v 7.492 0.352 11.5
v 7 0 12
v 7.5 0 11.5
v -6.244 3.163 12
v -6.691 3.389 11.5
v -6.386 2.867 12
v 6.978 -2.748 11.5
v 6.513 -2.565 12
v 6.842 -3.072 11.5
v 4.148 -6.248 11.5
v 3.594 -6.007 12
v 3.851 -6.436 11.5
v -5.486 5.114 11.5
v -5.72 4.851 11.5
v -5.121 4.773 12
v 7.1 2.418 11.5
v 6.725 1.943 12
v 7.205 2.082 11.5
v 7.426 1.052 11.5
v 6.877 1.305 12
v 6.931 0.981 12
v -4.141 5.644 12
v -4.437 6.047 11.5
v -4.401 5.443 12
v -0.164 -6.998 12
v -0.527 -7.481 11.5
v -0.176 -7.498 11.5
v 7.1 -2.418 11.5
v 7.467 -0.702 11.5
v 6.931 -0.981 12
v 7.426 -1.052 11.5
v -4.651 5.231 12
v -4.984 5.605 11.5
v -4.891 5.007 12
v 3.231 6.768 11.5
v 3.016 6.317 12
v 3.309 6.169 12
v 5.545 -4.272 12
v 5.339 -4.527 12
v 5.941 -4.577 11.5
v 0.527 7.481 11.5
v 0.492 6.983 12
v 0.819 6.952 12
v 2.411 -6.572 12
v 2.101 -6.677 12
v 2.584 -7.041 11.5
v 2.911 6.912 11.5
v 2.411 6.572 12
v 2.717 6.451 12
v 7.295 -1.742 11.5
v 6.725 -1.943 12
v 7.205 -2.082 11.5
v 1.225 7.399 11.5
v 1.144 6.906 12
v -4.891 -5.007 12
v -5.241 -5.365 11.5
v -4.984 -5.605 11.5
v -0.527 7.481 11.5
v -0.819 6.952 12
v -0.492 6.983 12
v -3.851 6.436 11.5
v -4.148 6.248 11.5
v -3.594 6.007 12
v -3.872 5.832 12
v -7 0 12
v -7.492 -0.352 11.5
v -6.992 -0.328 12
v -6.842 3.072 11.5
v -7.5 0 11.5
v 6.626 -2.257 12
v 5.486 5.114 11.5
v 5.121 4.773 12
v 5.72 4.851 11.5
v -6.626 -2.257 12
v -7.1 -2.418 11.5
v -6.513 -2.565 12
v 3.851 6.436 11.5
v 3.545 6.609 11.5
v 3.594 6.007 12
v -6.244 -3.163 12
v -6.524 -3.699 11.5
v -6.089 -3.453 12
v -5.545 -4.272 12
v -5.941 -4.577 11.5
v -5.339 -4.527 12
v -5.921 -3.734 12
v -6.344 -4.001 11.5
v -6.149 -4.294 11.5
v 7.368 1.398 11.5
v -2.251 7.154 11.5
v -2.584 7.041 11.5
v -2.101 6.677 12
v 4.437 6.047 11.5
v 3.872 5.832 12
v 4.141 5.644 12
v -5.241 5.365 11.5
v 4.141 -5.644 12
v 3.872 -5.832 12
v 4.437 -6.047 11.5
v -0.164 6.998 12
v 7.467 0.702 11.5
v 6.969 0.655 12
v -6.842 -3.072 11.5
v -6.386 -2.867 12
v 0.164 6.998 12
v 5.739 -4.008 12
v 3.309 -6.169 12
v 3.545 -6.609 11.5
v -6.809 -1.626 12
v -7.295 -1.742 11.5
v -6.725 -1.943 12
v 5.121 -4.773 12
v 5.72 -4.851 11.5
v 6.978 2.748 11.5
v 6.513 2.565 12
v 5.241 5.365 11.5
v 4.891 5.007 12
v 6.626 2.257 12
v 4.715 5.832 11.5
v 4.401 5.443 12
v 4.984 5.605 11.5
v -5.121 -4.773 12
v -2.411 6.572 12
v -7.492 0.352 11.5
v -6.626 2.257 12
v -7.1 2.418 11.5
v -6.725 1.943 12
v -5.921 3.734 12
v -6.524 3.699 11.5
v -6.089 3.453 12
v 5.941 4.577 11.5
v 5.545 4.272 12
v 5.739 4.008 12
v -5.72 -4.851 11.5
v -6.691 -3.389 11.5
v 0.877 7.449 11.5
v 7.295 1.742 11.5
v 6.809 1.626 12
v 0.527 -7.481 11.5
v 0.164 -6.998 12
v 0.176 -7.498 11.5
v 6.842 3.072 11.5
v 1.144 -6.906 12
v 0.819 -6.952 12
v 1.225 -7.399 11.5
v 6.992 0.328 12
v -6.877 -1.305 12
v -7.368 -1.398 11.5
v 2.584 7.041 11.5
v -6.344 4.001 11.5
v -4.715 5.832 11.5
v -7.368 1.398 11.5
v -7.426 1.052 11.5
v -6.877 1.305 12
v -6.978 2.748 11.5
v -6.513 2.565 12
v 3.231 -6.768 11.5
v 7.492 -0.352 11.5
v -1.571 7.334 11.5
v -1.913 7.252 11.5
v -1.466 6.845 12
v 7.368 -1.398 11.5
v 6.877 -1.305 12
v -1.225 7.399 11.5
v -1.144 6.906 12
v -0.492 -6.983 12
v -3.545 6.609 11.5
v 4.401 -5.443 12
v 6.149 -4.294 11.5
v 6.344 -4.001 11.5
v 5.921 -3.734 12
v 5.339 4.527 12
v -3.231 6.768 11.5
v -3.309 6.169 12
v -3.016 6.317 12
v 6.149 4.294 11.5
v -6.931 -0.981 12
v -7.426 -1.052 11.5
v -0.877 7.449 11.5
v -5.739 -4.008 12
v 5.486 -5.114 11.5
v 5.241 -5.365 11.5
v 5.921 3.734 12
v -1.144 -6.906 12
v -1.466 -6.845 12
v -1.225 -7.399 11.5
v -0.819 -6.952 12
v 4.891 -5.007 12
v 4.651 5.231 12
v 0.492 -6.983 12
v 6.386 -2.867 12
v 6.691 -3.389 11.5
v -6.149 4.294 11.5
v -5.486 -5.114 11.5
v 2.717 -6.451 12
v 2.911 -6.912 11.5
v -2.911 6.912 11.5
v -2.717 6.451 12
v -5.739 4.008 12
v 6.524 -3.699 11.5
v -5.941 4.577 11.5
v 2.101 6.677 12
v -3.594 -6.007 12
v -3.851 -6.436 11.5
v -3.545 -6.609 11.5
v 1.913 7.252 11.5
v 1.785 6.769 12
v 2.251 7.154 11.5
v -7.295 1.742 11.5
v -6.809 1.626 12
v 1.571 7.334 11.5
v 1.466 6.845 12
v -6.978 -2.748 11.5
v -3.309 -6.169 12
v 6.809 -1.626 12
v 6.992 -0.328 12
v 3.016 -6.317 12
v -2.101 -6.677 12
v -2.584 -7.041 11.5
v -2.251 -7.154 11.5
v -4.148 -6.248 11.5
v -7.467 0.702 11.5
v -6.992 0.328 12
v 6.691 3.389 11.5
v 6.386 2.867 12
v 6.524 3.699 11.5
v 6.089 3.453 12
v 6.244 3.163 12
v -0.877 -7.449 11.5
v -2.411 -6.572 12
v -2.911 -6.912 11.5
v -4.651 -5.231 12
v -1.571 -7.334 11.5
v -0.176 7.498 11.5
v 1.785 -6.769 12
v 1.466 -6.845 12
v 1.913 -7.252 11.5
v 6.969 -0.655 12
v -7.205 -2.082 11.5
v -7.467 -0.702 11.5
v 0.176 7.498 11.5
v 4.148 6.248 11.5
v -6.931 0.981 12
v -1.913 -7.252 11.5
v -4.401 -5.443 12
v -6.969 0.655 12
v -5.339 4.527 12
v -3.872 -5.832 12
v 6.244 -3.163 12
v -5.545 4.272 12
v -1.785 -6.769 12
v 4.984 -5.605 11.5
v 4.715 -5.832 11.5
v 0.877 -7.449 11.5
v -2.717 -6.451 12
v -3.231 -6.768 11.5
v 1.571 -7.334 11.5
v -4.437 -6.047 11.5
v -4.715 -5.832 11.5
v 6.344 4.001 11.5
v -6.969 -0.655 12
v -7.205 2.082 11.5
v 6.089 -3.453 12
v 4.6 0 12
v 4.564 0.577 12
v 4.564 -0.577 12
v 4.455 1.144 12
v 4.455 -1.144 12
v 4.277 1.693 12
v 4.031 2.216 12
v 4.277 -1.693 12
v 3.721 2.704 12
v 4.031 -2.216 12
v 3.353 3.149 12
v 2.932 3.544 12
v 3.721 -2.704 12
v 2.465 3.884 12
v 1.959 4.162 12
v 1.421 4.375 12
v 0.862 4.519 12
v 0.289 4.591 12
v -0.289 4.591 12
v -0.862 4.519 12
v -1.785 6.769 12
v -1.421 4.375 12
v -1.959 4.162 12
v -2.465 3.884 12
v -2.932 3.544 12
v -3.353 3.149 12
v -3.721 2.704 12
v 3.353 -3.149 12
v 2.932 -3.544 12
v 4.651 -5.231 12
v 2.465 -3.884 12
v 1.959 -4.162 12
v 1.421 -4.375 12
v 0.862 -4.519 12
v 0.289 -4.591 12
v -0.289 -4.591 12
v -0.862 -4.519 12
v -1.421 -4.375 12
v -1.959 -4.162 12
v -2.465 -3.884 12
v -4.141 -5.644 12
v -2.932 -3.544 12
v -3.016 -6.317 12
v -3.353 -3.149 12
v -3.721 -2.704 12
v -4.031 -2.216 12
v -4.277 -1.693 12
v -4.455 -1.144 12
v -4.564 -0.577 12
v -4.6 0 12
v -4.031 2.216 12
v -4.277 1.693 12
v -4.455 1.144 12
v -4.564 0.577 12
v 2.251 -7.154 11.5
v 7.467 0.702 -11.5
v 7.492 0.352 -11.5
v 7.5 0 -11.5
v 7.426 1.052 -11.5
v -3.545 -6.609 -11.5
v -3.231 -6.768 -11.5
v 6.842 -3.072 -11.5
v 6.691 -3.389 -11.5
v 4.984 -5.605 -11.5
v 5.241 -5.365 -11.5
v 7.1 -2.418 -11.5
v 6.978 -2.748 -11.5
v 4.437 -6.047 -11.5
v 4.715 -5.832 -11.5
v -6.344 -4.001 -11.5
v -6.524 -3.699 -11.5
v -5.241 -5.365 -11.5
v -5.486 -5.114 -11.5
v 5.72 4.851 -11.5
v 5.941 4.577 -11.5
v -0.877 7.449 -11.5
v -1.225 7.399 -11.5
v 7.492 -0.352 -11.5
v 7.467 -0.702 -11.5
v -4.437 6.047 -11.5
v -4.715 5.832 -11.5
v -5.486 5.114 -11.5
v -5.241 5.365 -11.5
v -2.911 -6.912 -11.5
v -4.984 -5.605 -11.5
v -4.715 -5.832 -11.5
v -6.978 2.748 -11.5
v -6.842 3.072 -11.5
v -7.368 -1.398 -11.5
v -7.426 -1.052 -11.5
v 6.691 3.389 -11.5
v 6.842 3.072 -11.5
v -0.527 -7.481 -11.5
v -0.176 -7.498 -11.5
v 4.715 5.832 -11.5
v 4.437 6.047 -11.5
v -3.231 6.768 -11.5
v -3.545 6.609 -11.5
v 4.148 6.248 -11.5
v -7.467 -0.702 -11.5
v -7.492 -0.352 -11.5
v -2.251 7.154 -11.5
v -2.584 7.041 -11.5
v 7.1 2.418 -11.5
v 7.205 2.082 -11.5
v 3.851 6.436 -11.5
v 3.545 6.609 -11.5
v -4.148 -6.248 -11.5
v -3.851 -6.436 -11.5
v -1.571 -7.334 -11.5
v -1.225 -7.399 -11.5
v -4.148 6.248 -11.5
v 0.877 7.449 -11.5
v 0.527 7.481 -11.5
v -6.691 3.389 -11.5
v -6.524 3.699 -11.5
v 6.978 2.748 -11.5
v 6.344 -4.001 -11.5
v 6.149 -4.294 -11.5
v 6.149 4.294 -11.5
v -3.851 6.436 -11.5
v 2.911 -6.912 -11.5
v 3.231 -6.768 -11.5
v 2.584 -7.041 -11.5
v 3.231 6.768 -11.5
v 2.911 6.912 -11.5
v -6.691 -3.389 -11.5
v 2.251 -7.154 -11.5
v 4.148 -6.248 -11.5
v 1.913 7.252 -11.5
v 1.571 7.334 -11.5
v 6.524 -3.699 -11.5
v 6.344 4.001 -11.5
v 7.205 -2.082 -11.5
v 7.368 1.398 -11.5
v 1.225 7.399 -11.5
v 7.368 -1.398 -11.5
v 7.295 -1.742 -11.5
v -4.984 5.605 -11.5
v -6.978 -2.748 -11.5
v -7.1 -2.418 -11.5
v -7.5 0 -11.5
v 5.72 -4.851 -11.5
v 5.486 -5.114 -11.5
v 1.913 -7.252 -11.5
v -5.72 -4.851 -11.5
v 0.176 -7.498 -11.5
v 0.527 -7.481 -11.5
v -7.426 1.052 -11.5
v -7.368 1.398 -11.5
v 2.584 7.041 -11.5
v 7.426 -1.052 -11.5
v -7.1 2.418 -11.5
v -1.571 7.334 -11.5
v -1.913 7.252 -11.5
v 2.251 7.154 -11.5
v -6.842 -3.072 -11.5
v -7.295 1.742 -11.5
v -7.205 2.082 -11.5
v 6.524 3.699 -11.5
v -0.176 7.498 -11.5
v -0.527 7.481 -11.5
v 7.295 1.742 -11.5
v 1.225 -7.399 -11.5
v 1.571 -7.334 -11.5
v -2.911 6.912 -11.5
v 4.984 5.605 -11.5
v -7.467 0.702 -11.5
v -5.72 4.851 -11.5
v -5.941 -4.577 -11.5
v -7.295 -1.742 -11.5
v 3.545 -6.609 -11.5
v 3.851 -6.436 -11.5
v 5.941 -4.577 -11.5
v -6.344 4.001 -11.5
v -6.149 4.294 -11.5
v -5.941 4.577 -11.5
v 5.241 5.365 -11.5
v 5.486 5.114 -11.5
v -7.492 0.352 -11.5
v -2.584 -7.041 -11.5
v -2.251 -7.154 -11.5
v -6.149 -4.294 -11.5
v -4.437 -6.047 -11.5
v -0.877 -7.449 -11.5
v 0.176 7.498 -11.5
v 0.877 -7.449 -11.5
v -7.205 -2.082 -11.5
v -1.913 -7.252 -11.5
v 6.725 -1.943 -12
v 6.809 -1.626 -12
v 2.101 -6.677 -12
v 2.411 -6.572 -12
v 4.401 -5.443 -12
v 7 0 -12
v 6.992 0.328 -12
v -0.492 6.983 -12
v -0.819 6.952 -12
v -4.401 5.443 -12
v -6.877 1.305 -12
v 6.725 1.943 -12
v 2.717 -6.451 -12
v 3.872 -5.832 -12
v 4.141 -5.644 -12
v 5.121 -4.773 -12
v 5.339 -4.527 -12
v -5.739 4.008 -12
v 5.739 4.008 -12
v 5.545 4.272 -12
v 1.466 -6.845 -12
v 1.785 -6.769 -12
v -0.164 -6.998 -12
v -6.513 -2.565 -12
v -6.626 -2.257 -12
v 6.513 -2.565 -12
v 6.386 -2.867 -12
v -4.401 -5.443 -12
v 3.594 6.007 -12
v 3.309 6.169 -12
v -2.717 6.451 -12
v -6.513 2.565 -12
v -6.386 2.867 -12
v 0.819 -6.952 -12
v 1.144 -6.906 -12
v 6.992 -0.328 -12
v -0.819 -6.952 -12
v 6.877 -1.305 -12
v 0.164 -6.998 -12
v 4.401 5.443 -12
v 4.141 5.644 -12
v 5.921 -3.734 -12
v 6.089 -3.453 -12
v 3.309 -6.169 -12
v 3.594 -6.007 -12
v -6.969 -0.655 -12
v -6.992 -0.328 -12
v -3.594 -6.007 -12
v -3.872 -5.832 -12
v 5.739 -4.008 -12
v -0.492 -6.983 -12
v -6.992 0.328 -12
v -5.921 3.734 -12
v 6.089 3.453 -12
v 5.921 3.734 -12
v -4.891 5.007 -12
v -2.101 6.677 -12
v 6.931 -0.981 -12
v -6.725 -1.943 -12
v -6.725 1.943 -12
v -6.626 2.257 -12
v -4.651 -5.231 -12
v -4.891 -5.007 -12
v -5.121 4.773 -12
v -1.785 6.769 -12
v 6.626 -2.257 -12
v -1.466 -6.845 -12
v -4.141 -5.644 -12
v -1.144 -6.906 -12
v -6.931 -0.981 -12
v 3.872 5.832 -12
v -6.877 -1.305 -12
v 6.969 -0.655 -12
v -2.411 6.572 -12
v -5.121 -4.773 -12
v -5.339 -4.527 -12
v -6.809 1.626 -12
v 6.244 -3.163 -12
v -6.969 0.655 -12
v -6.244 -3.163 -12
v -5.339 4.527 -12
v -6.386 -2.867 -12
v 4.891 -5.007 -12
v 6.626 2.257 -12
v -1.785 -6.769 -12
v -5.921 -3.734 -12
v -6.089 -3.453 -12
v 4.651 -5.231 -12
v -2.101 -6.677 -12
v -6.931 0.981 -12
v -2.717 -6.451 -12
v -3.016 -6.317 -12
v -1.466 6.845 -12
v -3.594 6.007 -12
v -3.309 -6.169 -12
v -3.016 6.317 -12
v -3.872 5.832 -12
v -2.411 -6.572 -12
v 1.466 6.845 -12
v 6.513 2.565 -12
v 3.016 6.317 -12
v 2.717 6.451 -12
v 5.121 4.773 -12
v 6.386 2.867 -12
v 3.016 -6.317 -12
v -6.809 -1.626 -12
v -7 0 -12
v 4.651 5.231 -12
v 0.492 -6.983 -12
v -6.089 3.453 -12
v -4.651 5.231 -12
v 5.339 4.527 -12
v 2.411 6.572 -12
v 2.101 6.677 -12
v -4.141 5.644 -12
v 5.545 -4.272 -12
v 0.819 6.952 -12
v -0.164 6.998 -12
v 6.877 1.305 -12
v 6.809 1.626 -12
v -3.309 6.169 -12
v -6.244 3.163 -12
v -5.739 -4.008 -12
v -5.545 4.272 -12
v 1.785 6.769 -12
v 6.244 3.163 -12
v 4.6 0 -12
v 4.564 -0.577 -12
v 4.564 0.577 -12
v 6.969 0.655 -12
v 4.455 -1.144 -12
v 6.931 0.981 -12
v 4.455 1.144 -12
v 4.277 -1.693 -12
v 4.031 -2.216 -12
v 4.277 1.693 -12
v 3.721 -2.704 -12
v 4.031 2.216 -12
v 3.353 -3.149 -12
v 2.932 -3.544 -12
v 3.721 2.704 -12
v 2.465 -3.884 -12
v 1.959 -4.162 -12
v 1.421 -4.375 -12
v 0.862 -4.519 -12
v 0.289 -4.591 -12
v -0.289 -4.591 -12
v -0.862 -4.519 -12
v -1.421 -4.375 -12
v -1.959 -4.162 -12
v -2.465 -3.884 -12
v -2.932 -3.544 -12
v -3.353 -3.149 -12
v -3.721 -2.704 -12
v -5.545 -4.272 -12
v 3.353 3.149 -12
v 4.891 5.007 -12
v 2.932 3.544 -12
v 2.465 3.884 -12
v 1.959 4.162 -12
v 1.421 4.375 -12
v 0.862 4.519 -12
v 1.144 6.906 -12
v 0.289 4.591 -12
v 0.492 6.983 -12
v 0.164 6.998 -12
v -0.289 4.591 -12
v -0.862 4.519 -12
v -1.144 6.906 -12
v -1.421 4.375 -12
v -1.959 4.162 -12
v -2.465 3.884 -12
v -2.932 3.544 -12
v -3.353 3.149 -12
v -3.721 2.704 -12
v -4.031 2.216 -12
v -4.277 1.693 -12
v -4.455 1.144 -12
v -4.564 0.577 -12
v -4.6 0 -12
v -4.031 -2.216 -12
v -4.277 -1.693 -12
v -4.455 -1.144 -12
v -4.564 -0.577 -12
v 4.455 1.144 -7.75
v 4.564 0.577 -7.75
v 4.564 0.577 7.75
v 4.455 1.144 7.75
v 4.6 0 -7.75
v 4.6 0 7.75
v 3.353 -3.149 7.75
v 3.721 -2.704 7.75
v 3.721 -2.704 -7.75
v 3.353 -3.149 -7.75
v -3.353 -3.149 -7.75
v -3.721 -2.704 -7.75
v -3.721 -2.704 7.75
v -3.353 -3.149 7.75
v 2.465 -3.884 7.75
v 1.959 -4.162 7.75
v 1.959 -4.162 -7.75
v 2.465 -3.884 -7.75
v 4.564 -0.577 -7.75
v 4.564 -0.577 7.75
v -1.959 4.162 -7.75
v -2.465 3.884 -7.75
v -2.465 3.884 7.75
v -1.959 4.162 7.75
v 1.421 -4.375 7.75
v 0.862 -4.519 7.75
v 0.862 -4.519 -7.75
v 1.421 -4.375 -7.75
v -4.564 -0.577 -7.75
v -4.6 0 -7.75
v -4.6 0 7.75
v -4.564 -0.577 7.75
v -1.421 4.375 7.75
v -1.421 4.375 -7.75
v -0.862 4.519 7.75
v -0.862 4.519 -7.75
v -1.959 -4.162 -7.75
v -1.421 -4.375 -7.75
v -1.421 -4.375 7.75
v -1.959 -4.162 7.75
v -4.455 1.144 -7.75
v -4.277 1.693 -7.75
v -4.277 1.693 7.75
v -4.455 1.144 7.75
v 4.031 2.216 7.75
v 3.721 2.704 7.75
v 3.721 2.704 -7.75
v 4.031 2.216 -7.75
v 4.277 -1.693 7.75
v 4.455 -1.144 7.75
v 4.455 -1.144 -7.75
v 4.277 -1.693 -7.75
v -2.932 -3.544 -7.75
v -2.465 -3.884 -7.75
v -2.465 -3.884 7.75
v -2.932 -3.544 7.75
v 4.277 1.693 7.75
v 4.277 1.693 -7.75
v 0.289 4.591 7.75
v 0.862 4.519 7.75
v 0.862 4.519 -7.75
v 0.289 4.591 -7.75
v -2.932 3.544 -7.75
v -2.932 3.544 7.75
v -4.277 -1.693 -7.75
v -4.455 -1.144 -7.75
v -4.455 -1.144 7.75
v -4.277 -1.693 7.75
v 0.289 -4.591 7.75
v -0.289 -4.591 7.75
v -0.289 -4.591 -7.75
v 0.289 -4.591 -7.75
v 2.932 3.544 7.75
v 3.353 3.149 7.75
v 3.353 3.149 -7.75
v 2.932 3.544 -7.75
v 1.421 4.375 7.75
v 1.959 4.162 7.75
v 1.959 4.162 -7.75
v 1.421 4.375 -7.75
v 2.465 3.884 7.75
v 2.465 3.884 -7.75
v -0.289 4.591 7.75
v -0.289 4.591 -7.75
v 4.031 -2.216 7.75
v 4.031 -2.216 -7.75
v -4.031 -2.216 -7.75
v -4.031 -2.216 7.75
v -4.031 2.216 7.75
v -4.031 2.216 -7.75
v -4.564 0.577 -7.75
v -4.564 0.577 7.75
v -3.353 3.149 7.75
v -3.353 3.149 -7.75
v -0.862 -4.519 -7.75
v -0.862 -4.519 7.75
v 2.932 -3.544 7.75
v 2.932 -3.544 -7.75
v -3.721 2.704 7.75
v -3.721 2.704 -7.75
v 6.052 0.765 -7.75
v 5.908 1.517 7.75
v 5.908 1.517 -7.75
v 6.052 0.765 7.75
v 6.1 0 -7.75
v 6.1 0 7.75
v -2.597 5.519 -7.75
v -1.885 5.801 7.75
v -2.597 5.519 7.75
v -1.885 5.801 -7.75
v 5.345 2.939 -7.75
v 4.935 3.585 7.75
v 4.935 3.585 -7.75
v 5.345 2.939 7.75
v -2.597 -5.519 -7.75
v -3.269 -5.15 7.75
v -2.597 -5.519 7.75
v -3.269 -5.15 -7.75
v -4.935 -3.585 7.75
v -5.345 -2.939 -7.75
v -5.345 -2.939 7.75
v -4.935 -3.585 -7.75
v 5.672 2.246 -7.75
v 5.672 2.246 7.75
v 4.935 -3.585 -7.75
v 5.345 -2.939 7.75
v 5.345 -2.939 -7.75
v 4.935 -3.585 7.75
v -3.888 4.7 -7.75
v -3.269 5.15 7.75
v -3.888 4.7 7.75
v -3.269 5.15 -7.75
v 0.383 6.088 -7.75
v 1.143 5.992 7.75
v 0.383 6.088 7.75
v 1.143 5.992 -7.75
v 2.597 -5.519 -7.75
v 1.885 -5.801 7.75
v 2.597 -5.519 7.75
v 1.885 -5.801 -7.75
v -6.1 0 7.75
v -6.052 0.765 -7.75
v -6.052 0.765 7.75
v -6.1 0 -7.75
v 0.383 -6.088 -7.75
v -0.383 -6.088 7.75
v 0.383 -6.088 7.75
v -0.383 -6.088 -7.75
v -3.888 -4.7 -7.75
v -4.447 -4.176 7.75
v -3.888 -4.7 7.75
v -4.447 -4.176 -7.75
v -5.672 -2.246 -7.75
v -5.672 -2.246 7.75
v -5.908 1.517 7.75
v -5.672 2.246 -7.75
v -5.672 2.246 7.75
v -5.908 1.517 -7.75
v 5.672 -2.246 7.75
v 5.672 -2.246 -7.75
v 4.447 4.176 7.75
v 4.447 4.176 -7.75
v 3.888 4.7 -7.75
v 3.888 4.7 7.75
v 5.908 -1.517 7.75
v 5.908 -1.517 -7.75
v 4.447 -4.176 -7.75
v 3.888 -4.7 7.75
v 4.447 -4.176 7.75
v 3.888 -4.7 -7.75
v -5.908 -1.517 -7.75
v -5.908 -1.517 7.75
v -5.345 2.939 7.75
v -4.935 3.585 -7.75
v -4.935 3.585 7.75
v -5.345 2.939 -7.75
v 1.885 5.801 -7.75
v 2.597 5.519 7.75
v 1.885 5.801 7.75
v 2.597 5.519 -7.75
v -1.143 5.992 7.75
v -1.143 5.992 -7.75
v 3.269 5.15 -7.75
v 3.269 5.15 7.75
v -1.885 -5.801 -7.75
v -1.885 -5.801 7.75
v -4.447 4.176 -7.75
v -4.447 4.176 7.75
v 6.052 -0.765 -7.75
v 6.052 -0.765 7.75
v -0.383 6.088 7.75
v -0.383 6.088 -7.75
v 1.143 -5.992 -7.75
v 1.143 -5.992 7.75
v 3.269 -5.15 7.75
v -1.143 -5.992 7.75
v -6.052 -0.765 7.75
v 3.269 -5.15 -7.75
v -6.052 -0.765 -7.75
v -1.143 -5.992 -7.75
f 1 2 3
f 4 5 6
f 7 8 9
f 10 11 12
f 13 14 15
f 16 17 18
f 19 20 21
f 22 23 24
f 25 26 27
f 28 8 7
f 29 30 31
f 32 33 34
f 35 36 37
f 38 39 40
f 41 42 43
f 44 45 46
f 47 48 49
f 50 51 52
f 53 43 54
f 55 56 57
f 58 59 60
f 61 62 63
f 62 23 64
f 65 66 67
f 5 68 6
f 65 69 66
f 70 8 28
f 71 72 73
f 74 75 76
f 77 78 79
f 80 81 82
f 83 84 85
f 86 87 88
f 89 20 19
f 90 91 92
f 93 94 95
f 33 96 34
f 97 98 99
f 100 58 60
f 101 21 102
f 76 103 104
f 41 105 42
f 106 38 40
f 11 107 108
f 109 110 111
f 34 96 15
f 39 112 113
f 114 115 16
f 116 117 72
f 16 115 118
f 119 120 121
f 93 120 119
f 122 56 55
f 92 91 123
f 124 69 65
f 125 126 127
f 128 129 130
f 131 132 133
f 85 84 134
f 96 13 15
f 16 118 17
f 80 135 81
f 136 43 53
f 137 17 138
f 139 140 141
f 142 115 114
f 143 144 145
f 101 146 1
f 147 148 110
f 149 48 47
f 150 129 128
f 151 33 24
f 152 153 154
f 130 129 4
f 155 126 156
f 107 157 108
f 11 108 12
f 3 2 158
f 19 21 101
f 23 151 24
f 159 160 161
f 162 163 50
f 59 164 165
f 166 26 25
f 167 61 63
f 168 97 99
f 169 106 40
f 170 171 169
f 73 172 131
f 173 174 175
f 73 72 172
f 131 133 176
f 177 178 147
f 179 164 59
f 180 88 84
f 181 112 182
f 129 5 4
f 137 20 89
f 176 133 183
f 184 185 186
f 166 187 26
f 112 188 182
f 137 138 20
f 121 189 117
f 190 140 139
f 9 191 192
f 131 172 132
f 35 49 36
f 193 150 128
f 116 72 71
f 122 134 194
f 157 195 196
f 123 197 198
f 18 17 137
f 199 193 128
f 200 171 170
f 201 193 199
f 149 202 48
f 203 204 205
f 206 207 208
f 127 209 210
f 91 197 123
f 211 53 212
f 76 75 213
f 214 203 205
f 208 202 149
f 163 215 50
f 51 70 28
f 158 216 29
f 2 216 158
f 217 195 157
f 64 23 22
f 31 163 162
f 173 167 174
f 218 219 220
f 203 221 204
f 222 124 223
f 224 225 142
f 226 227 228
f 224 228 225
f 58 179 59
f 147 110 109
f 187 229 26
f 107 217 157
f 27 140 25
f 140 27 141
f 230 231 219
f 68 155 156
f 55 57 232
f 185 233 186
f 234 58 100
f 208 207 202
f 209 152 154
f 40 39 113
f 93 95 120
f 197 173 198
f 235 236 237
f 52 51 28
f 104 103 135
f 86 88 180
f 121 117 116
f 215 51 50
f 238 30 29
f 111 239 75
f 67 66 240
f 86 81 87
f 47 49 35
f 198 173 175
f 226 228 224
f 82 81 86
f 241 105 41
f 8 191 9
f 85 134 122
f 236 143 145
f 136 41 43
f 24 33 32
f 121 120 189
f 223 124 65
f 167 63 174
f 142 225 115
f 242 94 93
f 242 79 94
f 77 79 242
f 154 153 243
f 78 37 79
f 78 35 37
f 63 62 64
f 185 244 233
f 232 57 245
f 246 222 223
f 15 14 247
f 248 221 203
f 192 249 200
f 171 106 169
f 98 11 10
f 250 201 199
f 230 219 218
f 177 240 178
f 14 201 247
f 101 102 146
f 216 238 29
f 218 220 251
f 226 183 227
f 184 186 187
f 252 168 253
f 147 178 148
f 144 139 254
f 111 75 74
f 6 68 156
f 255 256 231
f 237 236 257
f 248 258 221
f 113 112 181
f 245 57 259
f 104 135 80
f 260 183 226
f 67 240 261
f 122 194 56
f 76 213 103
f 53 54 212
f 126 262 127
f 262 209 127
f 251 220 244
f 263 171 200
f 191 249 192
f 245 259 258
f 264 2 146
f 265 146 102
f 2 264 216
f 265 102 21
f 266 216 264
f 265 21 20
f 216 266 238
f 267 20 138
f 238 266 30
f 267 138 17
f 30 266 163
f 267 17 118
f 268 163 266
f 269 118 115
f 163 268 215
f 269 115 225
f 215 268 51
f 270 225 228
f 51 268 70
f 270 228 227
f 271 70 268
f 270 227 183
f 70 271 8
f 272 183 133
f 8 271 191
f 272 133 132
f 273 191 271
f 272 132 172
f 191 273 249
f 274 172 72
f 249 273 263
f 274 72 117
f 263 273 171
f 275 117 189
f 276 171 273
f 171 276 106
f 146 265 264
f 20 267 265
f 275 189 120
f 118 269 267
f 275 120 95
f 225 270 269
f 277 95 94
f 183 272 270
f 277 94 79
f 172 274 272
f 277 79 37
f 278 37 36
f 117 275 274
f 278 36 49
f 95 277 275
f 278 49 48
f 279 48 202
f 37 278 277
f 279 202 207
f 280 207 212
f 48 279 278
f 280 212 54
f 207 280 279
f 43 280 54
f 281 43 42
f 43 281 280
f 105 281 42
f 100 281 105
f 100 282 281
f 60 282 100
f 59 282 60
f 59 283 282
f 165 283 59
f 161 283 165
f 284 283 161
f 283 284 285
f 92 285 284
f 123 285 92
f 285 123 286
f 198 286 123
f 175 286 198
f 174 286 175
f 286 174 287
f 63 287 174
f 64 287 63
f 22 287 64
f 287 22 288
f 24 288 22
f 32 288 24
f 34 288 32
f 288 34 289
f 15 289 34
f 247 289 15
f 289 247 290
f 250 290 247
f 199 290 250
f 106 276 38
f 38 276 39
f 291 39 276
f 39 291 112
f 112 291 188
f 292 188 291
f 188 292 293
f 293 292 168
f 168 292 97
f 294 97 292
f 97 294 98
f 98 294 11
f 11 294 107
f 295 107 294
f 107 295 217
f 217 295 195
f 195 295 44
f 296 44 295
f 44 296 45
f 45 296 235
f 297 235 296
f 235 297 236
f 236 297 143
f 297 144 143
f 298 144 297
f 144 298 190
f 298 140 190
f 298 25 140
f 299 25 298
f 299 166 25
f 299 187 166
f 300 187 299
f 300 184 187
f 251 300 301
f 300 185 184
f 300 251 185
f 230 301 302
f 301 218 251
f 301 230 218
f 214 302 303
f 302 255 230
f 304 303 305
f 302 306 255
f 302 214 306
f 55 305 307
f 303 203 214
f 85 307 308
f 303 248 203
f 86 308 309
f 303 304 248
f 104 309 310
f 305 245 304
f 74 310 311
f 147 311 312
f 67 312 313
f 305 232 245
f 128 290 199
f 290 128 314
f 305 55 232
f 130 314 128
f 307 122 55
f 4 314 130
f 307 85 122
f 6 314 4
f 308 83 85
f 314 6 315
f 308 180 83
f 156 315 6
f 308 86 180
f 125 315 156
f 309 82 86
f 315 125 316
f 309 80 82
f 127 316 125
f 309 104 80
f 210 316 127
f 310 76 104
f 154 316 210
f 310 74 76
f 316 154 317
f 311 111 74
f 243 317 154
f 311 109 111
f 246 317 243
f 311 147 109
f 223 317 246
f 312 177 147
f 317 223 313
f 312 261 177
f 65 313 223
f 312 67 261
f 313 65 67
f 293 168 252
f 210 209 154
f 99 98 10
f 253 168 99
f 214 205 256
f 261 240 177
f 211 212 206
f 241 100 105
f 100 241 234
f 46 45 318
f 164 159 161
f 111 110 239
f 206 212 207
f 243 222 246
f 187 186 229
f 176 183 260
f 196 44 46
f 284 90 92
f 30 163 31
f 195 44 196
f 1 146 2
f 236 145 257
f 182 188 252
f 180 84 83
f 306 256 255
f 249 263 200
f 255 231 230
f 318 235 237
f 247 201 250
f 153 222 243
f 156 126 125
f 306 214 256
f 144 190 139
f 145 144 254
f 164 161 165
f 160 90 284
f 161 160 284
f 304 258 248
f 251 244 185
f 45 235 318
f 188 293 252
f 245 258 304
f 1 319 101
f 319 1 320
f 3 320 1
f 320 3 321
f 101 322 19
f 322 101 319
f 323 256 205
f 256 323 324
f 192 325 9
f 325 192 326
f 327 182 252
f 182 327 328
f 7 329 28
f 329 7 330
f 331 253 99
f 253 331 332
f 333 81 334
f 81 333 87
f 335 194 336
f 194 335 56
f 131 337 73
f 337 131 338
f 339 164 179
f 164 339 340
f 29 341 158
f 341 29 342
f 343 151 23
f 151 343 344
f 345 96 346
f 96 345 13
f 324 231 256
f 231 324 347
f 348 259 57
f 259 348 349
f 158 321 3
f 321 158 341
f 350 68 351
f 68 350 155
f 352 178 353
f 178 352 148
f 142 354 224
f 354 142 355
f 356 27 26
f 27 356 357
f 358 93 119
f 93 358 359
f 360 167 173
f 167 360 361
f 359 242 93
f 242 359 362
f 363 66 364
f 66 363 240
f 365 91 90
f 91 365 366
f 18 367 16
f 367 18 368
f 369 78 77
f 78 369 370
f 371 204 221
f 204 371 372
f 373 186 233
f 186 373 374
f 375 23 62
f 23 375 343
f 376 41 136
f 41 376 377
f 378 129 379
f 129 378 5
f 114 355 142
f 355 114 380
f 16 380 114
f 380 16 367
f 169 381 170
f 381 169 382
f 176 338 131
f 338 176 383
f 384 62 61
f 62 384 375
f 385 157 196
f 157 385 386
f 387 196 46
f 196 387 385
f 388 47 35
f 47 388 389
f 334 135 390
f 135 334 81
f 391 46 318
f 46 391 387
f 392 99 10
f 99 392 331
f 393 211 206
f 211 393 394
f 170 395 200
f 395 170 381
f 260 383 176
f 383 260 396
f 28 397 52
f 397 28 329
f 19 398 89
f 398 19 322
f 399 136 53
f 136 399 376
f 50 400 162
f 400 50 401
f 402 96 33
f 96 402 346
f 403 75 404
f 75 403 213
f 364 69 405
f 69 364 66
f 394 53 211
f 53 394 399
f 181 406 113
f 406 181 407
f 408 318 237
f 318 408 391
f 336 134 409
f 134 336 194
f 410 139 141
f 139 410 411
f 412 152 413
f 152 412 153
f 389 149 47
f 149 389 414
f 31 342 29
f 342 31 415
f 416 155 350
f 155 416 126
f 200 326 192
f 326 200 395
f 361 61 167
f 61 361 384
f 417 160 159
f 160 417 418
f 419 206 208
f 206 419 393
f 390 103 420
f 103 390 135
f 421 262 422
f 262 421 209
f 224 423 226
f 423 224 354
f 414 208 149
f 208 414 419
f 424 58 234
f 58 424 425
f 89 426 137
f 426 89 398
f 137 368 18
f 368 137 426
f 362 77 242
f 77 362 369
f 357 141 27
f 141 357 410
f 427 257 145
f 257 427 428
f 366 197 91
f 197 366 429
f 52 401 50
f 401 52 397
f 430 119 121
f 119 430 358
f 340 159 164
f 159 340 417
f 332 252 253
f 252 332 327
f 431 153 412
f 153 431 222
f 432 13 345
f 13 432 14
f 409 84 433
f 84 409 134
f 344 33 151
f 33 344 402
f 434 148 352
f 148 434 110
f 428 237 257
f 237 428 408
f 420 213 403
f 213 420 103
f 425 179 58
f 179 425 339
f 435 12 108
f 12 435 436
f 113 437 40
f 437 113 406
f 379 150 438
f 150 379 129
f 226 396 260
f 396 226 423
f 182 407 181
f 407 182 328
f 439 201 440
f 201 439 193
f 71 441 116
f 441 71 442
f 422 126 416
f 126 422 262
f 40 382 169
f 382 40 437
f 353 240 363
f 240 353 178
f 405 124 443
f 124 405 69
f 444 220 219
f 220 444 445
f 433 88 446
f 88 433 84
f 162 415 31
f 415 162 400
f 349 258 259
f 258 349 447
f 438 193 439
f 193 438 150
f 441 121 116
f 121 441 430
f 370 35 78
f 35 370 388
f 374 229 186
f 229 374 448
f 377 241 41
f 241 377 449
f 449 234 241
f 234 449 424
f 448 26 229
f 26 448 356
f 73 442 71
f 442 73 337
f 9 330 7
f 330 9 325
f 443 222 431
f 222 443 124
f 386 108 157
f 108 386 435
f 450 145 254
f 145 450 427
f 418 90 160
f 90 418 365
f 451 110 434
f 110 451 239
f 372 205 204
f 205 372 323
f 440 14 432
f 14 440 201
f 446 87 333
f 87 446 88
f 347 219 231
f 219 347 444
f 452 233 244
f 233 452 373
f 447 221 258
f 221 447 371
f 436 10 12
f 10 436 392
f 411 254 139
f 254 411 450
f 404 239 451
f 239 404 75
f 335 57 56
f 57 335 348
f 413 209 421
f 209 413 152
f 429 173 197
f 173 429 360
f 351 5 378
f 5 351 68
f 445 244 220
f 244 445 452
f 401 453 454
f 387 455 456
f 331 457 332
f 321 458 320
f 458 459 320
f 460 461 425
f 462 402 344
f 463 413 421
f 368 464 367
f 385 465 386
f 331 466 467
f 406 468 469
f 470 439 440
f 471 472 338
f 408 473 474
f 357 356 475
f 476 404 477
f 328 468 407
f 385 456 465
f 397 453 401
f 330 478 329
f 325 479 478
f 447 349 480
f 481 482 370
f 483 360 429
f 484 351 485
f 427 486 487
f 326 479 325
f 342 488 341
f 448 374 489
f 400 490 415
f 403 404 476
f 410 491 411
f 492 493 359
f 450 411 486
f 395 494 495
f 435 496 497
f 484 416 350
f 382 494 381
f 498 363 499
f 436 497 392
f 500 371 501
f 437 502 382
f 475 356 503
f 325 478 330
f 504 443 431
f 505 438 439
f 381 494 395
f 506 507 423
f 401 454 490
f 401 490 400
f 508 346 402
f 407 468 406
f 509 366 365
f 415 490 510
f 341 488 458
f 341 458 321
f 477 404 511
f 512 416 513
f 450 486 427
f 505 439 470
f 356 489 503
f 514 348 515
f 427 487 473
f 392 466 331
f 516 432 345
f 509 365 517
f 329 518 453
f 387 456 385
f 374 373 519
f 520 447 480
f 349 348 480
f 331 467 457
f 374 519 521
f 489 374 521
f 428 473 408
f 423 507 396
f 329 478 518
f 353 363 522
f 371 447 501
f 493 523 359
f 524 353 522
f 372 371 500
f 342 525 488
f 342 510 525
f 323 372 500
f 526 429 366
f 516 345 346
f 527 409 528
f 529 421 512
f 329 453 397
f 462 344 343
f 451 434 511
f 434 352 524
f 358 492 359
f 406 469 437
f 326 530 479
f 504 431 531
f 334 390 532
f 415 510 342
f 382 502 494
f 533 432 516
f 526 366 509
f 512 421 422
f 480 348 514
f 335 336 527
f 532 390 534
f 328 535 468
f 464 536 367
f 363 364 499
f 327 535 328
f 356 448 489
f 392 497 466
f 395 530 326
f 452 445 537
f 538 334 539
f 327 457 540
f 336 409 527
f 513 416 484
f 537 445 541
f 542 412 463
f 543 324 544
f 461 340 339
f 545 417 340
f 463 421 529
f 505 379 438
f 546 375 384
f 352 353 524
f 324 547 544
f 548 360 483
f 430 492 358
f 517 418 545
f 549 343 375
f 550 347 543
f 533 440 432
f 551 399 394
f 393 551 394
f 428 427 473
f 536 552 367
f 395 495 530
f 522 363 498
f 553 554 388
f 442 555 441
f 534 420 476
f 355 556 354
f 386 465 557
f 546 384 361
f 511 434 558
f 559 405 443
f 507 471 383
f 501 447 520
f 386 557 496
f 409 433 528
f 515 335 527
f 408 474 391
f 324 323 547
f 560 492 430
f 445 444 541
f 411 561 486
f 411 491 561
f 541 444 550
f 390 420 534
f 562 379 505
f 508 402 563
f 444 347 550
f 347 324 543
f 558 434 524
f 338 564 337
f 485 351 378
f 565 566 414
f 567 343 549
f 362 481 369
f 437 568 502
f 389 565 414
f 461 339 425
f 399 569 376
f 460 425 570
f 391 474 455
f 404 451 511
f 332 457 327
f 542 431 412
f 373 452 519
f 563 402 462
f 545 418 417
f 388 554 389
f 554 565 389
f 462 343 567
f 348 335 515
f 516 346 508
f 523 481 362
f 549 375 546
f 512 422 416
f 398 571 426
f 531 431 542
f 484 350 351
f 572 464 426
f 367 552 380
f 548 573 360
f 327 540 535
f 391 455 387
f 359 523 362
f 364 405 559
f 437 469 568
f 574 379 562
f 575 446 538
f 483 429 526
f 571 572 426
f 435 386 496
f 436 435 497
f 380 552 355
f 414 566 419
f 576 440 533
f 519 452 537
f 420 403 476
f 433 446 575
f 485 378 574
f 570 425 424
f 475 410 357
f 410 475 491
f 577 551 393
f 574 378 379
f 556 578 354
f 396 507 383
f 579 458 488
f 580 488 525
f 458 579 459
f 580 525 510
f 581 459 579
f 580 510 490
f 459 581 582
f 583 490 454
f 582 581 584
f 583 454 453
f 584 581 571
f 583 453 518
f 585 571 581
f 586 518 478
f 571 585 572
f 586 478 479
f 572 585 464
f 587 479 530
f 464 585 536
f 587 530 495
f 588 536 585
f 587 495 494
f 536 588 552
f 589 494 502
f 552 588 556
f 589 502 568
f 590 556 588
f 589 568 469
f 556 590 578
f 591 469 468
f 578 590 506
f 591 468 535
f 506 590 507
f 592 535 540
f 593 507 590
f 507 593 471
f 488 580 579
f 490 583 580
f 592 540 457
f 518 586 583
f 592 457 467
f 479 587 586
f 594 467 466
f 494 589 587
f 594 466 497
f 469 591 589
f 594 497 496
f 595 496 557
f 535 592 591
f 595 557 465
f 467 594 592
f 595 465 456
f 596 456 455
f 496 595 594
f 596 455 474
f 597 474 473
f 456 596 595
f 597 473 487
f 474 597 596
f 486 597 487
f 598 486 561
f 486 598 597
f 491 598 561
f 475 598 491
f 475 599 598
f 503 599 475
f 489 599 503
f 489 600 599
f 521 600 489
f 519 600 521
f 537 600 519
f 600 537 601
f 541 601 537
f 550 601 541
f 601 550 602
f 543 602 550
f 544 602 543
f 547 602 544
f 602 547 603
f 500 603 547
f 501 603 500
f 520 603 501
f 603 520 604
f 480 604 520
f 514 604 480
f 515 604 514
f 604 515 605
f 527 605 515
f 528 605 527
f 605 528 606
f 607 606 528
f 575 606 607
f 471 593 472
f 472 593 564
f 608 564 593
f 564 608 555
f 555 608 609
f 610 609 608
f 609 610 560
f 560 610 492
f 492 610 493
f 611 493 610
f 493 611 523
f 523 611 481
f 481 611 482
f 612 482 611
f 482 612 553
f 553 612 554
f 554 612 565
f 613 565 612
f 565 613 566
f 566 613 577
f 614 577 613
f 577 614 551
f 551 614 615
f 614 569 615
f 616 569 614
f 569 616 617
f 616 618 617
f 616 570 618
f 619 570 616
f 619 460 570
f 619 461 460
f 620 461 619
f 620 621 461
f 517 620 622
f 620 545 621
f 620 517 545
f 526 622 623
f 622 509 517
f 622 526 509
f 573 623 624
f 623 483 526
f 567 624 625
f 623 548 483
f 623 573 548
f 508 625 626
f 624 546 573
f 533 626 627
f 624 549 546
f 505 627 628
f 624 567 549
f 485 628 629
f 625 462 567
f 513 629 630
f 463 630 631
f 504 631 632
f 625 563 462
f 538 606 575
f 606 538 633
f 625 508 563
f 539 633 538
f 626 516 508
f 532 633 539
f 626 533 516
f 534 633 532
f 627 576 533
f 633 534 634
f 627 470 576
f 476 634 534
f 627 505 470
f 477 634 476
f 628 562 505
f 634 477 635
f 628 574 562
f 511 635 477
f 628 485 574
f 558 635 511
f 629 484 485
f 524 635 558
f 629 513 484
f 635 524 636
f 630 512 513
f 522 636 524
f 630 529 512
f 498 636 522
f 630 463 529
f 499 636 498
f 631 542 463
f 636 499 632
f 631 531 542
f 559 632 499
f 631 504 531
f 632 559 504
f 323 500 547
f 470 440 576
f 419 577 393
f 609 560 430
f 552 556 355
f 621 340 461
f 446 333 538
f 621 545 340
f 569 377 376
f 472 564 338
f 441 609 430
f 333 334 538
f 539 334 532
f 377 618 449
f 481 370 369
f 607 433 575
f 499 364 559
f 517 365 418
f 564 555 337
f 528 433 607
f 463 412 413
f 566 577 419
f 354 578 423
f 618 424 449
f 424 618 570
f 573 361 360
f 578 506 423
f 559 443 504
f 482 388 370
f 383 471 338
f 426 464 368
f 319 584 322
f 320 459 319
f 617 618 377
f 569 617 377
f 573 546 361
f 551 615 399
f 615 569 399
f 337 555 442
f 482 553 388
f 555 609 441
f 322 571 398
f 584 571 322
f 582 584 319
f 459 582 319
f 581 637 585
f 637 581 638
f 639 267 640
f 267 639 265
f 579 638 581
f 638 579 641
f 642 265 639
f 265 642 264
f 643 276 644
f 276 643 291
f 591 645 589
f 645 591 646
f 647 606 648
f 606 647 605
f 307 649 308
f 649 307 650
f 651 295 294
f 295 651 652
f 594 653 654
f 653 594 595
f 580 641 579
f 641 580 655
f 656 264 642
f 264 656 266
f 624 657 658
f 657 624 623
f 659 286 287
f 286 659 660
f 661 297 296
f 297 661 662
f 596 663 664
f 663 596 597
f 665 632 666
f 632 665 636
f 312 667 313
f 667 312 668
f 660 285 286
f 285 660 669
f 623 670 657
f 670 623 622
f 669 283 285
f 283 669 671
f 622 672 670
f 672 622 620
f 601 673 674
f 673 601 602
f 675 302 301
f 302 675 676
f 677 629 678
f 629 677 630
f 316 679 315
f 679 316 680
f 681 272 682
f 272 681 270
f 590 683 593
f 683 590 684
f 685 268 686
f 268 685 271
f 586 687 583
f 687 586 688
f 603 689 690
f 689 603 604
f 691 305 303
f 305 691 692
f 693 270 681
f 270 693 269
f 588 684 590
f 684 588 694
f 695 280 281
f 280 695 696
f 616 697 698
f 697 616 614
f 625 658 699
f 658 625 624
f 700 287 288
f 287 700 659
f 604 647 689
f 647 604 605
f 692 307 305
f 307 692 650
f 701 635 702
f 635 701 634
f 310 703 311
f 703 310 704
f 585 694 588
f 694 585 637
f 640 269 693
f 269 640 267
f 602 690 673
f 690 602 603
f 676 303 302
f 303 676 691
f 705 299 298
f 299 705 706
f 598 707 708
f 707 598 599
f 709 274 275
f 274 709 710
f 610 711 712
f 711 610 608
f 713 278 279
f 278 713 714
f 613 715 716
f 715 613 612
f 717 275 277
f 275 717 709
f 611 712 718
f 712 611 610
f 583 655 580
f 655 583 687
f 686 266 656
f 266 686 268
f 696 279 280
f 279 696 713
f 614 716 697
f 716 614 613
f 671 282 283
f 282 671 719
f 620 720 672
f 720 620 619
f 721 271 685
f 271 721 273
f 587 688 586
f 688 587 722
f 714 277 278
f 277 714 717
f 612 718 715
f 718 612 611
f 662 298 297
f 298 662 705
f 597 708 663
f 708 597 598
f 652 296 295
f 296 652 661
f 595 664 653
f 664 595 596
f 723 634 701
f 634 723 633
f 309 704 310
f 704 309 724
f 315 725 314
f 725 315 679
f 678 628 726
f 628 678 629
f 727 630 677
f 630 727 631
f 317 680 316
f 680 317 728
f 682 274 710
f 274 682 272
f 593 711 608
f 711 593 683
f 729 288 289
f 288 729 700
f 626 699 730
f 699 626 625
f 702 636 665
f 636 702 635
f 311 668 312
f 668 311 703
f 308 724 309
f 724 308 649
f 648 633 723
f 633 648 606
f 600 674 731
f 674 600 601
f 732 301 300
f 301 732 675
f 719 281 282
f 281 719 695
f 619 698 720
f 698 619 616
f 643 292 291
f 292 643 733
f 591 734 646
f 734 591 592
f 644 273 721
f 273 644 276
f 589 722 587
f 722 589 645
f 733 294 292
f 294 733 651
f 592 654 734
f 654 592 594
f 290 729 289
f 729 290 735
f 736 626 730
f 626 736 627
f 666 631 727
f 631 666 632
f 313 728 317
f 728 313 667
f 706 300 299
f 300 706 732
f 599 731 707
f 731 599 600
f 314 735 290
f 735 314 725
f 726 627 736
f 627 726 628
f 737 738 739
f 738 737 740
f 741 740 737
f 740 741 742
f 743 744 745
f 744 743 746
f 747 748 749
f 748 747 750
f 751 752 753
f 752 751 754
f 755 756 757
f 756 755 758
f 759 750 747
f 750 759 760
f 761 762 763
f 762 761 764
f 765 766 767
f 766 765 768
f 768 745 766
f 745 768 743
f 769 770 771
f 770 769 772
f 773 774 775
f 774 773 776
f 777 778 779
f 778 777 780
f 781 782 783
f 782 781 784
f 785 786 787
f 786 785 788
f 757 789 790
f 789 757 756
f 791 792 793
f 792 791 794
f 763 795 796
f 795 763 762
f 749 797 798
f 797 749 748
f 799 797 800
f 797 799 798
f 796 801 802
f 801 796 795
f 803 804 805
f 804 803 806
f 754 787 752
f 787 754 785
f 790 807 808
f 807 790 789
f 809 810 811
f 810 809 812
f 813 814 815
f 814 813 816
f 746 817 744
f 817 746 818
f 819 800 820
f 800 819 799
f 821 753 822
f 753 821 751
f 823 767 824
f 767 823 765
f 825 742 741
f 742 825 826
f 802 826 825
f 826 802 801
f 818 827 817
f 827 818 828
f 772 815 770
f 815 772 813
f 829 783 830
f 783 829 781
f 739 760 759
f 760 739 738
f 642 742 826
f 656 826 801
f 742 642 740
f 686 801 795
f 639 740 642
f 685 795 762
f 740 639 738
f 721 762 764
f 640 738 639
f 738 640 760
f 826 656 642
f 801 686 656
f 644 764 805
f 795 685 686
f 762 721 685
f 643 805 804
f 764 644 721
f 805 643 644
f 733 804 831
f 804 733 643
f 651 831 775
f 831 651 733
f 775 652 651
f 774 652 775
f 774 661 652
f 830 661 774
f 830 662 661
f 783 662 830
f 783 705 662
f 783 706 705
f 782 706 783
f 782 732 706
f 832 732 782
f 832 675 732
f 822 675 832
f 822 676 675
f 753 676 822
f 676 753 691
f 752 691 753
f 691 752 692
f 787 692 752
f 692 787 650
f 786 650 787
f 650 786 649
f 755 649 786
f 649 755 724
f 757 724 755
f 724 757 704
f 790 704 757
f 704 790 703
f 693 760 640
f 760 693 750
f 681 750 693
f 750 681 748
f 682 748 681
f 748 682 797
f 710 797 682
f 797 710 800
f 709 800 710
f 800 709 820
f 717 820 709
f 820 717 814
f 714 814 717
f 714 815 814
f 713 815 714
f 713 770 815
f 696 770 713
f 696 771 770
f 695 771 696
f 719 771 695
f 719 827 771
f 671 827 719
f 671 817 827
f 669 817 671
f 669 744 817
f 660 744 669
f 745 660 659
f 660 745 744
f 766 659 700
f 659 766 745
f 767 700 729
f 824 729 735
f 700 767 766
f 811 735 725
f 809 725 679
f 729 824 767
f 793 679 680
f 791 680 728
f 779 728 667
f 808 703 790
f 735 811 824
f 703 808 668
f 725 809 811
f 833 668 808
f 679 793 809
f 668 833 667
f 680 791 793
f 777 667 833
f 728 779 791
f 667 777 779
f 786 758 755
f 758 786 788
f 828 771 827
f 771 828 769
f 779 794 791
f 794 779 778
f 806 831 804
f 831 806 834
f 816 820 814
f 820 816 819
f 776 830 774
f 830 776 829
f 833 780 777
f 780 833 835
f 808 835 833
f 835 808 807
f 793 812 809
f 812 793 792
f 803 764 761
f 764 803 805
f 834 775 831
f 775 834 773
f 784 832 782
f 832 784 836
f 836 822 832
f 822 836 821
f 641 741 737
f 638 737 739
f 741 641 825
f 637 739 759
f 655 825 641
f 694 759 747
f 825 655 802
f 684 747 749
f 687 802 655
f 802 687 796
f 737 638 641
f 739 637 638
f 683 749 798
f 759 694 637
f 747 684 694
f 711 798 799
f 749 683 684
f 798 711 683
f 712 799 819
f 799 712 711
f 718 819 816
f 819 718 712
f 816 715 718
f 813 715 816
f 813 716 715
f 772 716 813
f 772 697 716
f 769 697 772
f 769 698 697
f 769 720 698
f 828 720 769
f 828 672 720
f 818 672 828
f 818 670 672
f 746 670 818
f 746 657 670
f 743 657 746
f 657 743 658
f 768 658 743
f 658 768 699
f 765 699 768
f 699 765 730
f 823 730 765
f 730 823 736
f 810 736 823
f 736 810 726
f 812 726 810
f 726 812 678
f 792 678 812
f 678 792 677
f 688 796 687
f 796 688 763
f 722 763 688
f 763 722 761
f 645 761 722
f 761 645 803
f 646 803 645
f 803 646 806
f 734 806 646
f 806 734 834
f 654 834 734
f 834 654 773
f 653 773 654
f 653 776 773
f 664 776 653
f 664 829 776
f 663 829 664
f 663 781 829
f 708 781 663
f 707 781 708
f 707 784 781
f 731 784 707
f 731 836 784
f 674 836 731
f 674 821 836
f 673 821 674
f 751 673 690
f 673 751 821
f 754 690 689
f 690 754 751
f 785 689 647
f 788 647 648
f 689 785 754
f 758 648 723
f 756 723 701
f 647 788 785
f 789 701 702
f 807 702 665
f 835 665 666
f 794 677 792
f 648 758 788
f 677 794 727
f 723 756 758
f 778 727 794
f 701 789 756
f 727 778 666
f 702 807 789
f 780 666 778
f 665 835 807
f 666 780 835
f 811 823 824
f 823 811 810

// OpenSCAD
/**
  * Christian Völlinger 2016
  * bushing_adapter
  */

// length of the adapter, 24mm for a lm8uu
h=24;
// length of the adapter bushing
l=15.5;
// diameter of the adapter, 15mm for a lm8uu
d=15;
// diameter of the rods + clearance
dRod=9.2;
// outer diameter of the adapted bushing, I uses 12.2
id=12.2; 

// ignore this variable!
$fn=50;




difference() {
    translate([0,0,-h/2]) chamferCylinder(h, d/2, chamferHeight = 0.5, quality = 1); 
    cylinder(h = 24, r = dRod/2, center = true);
    cylinder(h = l, r = id/2, center = true);
}


/**
  *  The MIT License (MIT)
  *
  *  "Chamfers for OpenSCAD" v0.31 Copyright (c) 2016 SebiTimeWaster
  *
  *  Permission is hereby granted, free of charge, to any person obtaining a copy
  *  of this software and associated documentation files (the "Software"), to deal
  *  in the Software without restriction, including without limitation the rights
  *  to use, copy, modify, merge, publish, distribute, sublicense, and/or sell
  *  copies of the Software, and to permit persons to whom the Software is
  *  furnished to do so, subject to the following conditions:
  *
  *  The above copyright notice and this permission notice shall be included in all
  *  copies or substantial portions of the Software.
  *
  *  THE SOFTWARE IS PROVIDED "AS IS", WITHOUT WARRANTY OF ANY KIND, EXPRESS OR
  *  IMPLIED, INCLUDING BUT NOT LIMITED TO THE WARRANTIES OF MERCHANTABILITY,
  *  FITNESS FOR A PARTICULAR PURPOSE AND NONINFRINGEMENT. IN NO EVENT SHALL THE
  *  AUTHORS OR COPYRIGHT HOLDERS BE LIABLE FOR ANY CLAIM, DAMAGES OR OTHER
  *  LIABILITY, WHETHER IN AN ACTION OF CONTRACT, TORT OR OTHERWISE, ARISING FROM,
  *  OUT OF OR IN CONNECTION WITH THE SOFTWARE OR THE USE OR OTHER DEALINGS IN THE
  *  SOFTWARE.
  */

/**

/**
  * chamferCylinder returns an cylinder or cone with 45° chamfers on
  * the edges of the cylinder. The chamfers are diectly printable on
  * Fused deposition modelling (FDM) printers without support structures.
  *
  * @param  height         Height of the cylinder
  * @param  radius         Radius of the cylinder (At the bottom)
  * @param  radius2        Radius of the cylinder (At the top)
  * @param  chamferHeight  The "height" of the chamfers as seen from
  *                        one of the dimensional planes (The real
  *                        width is side c in a right angled triangle)
  * @param  angle          The radius of the visible part of a wedge
  *                        starting from the x axis counter-clockwise
  * @param  quality        A circle quality factor where 1.0 is a fairly
  *                        good quality, range from 0.0 to 2.0
  */
module chamferCylinder(height, radius, radius2=undef, chamferHeight = 1, angle = 0, quality = -1.0) {
    radius2 = (radius2 == undef) ? radius : radius2;
    module cc() {
        if(chamferHeight != 0) {
            translate([0, 0, height - abs(chamferHeight)]) cylinder(abs(chamferHeight), r1 = radius2, r2 = radius2 - chamferHeight, $fn = circleSegments(radius2, quality));
        }
        translate([0, 0, abs(chamferHeight)]) cylinder(height - abs(chamferHeight) * 2, r1 = radius, r2 = radius2, $fn = circleSegments(max(radius, radius2), quality));
        if(chamferHeight != 0) {
            cylinder(abs(chamferHeight), r1 = radius - chamferHeight, r2 = radius, $fn = circleSegments(radius, quality));
        }
    }
    module box(brim = abs(min(chamferHeight, 0)) + 1) {
        translate([-radius - brim, 0, -brim]) cube([radius * 2 + brim * 2, radius + brim, height + brim * 2]);
    }
    module hcc() {
        intersection() {
            cc();
            box();
        }
    }
    if(angle <= 0 || angle >= 360) cc();
    else {
        if(angle > 180) hcc();
        difference() {
            if(angle <= 180) hcc();
            else rotate([0, 0, 180]) hcc();
            rotate([0, 0, angle]) box(abs(min(chamferHeight, 0)) + radius);
        }
    }
}

/**
  * circleSegments calculates the number of segments needed to maintain
  * a constant circle quality.
  * If a globalSegementsQuality variable exist it will overwrite the
  * standard quality setting (1.0). Order of usage is:
  * Standard (1.0) <- globalCircleQuality <- Quality parameter
  *
  * @param  r        Radius of the circle
  * @param  quality  A quality factor, where 1.0 is a fairly good
  *                  quality, range from 0.0 to 2.0
  *
  * @return  The number of segments for the circle
  */
function circleSegments(r, quality = -1.0) = (r * PI * 4 + 40) * ((quality >= 0.0) ? quality : globalCircleQuality);

// set global quality to 1.0, can be overridden by user
globalCircleQuality = 1.0;
